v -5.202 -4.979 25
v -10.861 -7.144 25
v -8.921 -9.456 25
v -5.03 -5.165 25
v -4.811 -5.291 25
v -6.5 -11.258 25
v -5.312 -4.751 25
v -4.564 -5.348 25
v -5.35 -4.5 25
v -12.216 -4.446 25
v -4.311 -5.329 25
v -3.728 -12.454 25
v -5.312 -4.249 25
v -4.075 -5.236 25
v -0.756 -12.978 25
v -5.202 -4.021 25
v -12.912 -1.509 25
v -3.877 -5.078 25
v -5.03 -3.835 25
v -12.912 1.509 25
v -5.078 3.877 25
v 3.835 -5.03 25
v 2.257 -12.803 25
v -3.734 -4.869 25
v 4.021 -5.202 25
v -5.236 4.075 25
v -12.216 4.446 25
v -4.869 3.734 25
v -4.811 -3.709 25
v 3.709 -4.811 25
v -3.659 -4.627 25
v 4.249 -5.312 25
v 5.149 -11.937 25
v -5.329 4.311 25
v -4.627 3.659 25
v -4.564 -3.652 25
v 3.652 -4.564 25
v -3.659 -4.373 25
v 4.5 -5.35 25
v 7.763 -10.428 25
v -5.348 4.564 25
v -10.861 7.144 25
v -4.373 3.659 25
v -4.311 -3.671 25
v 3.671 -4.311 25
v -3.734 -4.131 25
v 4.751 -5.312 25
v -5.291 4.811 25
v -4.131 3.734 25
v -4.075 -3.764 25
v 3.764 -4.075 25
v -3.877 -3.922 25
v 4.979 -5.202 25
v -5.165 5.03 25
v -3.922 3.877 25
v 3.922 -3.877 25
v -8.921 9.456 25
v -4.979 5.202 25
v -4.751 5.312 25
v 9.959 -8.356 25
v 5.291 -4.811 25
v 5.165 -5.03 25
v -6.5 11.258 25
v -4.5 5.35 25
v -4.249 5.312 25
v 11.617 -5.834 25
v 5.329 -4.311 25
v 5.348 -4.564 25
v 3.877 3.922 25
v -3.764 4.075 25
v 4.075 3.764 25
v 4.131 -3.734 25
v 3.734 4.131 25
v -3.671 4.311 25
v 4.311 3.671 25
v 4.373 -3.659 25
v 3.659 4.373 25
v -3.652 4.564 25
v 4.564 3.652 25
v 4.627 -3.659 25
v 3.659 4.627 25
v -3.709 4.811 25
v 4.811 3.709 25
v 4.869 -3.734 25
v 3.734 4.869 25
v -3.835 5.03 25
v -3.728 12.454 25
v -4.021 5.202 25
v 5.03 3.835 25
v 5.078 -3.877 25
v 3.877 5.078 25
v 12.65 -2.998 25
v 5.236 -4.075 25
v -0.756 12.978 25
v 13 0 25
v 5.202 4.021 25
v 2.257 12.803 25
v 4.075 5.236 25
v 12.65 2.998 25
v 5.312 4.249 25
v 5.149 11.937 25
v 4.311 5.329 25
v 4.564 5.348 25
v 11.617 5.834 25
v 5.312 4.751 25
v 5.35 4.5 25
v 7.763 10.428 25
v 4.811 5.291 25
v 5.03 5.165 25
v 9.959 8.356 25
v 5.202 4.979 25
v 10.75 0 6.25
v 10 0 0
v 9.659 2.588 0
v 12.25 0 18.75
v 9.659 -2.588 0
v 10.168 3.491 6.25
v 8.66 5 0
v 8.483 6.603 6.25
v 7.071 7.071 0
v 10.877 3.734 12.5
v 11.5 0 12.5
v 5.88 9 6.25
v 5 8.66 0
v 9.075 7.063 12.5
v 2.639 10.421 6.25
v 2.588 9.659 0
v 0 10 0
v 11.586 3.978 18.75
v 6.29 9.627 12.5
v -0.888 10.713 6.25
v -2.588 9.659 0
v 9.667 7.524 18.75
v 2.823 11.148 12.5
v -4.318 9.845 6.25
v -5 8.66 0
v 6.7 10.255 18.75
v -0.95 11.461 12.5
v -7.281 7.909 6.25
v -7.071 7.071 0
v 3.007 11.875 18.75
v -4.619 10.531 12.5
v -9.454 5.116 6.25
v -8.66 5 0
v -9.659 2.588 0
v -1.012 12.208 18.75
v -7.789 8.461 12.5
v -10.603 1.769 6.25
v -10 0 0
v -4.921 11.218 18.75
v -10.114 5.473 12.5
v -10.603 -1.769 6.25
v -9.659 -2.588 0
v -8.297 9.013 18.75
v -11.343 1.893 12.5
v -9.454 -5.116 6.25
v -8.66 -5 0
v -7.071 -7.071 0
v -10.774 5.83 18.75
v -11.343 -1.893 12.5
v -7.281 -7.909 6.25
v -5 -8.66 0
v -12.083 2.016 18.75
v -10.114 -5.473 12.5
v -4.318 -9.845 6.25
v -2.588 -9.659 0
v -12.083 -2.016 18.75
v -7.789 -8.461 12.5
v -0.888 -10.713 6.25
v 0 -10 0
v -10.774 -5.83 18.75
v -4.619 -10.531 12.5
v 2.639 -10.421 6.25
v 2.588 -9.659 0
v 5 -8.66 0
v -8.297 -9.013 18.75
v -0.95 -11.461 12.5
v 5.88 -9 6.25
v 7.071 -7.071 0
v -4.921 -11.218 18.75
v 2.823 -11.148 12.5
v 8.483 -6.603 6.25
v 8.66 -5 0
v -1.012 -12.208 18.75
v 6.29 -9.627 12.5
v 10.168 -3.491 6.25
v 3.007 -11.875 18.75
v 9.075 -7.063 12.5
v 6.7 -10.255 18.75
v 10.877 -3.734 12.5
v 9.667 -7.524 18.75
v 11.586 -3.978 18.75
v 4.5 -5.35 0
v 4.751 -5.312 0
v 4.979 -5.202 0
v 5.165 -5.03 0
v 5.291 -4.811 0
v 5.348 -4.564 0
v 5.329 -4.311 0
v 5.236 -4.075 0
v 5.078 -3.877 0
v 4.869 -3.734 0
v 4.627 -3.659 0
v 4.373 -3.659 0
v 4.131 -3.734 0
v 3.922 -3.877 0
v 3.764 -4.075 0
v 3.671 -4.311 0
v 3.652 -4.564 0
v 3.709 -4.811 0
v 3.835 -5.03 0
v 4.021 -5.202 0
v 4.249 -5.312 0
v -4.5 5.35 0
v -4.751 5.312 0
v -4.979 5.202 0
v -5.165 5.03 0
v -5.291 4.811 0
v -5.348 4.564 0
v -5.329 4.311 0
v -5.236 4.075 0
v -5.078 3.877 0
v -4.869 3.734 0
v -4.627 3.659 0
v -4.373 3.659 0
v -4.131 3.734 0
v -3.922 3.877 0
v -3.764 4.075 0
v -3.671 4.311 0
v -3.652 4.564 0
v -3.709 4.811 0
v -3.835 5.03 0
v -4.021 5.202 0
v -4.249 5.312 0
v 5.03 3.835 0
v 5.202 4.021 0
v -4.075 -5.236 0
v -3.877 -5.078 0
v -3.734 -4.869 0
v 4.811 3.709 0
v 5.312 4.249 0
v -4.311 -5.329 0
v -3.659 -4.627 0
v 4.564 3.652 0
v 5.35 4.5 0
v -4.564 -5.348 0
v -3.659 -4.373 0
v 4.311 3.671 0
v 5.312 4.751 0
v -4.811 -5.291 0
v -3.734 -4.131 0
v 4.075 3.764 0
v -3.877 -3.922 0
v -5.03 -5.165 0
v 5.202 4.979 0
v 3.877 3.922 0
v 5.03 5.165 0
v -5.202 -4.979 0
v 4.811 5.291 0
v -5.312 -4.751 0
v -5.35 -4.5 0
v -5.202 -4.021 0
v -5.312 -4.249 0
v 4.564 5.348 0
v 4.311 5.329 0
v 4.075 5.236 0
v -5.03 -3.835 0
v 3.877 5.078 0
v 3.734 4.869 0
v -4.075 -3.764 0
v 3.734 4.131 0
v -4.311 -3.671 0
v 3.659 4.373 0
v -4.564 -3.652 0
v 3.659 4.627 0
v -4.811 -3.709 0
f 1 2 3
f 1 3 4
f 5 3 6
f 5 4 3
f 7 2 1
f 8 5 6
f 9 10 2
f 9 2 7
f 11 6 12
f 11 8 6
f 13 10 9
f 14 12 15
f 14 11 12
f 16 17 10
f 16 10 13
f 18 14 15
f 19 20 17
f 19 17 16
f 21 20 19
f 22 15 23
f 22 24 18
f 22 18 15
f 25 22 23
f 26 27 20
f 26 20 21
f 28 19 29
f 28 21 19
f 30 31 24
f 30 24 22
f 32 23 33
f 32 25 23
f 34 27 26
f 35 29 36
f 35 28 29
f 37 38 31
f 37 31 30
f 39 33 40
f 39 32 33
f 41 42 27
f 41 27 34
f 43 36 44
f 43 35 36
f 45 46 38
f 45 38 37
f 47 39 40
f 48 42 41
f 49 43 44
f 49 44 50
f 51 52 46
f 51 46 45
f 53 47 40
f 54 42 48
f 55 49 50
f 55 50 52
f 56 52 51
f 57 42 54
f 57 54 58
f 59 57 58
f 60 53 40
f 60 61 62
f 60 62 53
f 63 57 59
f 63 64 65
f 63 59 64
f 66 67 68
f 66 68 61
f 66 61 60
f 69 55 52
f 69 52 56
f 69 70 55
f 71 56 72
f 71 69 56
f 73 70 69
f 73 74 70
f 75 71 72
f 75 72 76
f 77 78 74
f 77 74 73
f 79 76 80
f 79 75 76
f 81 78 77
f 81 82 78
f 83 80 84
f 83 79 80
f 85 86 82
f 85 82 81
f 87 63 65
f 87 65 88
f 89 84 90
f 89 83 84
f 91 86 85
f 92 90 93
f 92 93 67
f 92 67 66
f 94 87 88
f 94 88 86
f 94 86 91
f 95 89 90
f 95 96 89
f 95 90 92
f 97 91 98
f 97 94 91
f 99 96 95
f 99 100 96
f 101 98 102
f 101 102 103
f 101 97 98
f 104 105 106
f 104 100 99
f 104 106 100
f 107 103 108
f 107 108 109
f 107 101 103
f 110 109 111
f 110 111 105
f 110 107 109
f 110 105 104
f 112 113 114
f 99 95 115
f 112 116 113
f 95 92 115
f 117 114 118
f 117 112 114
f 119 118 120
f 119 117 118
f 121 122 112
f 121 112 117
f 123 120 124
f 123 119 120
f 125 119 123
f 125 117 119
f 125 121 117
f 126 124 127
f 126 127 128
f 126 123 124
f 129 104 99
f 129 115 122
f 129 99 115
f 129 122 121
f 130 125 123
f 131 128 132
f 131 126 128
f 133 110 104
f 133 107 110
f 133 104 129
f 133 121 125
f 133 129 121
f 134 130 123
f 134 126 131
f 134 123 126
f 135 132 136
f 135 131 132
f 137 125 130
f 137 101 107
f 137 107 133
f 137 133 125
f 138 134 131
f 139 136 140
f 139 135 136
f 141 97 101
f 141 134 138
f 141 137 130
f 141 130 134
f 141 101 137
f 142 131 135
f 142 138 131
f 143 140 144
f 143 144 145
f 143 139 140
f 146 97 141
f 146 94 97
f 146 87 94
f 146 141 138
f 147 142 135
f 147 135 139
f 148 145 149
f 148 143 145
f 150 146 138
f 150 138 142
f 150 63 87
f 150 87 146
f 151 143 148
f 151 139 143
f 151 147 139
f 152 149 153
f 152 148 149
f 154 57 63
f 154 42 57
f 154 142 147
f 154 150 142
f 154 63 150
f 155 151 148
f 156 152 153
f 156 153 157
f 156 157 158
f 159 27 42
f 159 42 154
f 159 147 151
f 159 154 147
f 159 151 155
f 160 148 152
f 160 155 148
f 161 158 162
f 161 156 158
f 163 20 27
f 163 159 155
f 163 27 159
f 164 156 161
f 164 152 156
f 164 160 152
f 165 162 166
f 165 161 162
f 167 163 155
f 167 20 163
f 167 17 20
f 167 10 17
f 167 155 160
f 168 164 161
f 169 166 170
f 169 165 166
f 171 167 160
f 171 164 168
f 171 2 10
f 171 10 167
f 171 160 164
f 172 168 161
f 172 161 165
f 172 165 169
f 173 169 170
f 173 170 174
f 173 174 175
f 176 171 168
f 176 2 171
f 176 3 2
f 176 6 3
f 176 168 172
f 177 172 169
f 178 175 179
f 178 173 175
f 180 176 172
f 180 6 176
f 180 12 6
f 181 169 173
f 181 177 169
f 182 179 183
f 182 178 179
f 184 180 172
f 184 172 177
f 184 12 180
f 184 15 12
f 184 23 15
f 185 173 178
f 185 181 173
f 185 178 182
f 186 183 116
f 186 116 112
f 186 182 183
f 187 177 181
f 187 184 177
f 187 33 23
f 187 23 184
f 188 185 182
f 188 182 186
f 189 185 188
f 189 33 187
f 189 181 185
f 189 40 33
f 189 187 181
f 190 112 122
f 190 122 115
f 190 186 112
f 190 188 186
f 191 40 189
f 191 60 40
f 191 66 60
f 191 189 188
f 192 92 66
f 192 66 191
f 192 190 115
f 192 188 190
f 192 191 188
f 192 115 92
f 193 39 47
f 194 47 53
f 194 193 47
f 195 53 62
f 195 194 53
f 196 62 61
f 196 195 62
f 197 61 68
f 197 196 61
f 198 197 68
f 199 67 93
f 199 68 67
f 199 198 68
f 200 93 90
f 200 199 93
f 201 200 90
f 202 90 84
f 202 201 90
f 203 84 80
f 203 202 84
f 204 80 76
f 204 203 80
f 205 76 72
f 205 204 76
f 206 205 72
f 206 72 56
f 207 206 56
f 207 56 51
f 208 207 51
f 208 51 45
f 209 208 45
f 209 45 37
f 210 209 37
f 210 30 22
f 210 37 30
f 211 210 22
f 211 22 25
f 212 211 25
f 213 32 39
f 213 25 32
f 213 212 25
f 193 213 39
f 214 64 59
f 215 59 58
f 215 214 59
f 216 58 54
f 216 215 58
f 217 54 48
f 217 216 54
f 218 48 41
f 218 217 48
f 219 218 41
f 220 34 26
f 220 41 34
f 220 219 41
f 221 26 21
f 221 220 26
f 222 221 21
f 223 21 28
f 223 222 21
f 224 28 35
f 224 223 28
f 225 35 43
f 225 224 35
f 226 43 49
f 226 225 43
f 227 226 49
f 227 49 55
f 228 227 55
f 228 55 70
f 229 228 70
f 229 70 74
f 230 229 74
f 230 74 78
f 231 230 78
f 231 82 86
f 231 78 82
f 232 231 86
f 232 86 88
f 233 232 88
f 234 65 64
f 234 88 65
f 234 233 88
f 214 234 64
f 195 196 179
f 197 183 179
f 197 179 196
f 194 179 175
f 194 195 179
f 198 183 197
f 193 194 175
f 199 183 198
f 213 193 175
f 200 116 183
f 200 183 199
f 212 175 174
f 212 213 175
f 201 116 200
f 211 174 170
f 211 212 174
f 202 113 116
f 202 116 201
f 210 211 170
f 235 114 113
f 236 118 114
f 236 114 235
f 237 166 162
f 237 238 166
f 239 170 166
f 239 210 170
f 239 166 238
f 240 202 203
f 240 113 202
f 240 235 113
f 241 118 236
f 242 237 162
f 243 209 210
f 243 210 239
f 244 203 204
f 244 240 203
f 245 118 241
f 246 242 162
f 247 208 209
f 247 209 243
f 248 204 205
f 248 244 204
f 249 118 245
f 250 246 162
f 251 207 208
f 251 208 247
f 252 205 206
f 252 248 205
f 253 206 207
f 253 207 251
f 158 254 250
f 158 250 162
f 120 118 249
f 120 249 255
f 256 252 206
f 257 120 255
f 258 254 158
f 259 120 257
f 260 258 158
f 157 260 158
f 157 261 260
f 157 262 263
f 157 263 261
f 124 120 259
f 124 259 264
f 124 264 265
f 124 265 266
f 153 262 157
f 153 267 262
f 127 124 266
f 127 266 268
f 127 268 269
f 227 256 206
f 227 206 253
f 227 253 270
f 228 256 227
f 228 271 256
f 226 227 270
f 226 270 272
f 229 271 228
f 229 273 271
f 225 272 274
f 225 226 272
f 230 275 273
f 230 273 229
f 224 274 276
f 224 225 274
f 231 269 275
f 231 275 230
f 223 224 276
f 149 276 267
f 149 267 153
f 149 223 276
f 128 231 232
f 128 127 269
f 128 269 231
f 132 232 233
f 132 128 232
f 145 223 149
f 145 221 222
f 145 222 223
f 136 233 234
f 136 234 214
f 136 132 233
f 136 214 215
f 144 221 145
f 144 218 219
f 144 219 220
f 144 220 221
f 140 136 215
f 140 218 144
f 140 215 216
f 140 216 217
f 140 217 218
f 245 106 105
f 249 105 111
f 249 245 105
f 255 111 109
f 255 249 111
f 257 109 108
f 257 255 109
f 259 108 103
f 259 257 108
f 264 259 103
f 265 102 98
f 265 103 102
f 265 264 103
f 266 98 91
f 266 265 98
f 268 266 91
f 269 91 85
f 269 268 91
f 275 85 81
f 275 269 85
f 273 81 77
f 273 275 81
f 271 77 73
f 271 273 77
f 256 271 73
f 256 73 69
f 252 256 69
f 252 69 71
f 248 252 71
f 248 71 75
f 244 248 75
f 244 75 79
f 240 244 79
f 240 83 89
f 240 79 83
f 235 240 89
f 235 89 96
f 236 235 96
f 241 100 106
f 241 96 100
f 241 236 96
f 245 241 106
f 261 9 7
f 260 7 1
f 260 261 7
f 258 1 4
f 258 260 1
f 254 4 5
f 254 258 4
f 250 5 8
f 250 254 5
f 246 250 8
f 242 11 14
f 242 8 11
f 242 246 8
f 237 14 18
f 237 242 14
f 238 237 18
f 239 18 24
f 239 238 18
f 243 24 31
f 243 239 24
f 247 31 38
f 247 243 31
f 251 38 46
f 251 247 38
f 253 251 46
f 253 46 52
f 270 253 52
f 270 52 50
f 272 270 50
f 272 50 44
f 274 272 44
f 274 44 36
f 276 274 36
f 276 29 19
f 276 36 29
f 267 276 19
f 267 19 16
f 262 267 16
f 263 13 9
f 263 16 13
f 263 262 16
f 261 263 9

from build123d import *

# Parameters (mm, degrees)
CYLINDER001_R      = 0.85
CYLINDER001_DEPTH  = 50
POLARPATTERN_COUNT = 4


with BuildPart() as part:
    # Cone → Cone (revolve)
    with BuildSketch(Plane.XZ):
        Polygon((0, 0), (10, 0), (13, 25), (0, 25), align=None)
    revolve(axis=Axis((0, 0, 0), (0, 0, 1)))

    # Cylinder001 → Cylinder001 (cut)
    with BuildSketch(Plane(origin=(4.5, 4.5, 0), x_dir=(1, 0, 0), z_dir=(0, 0, 1))):
        Circle(CYLINDER001_R)
    cylinder001 = extrude(amount=CYLINDER001_DEPTH, mode=Mode.SUBTRACT)

    # PolarPattern: Cylinder001 ×4 about axis
    polarpattern_axis = Axis((0, 0, 0), (0, 0, 1))
    for i in range(1, POLARPATTERN_COUNT):
        add(cylinder001.rotate(polarpattern_axis, i * 360 / POLARPATTERN_COUNT), mode=Mode.SUBTRACT)


solid = part.part
